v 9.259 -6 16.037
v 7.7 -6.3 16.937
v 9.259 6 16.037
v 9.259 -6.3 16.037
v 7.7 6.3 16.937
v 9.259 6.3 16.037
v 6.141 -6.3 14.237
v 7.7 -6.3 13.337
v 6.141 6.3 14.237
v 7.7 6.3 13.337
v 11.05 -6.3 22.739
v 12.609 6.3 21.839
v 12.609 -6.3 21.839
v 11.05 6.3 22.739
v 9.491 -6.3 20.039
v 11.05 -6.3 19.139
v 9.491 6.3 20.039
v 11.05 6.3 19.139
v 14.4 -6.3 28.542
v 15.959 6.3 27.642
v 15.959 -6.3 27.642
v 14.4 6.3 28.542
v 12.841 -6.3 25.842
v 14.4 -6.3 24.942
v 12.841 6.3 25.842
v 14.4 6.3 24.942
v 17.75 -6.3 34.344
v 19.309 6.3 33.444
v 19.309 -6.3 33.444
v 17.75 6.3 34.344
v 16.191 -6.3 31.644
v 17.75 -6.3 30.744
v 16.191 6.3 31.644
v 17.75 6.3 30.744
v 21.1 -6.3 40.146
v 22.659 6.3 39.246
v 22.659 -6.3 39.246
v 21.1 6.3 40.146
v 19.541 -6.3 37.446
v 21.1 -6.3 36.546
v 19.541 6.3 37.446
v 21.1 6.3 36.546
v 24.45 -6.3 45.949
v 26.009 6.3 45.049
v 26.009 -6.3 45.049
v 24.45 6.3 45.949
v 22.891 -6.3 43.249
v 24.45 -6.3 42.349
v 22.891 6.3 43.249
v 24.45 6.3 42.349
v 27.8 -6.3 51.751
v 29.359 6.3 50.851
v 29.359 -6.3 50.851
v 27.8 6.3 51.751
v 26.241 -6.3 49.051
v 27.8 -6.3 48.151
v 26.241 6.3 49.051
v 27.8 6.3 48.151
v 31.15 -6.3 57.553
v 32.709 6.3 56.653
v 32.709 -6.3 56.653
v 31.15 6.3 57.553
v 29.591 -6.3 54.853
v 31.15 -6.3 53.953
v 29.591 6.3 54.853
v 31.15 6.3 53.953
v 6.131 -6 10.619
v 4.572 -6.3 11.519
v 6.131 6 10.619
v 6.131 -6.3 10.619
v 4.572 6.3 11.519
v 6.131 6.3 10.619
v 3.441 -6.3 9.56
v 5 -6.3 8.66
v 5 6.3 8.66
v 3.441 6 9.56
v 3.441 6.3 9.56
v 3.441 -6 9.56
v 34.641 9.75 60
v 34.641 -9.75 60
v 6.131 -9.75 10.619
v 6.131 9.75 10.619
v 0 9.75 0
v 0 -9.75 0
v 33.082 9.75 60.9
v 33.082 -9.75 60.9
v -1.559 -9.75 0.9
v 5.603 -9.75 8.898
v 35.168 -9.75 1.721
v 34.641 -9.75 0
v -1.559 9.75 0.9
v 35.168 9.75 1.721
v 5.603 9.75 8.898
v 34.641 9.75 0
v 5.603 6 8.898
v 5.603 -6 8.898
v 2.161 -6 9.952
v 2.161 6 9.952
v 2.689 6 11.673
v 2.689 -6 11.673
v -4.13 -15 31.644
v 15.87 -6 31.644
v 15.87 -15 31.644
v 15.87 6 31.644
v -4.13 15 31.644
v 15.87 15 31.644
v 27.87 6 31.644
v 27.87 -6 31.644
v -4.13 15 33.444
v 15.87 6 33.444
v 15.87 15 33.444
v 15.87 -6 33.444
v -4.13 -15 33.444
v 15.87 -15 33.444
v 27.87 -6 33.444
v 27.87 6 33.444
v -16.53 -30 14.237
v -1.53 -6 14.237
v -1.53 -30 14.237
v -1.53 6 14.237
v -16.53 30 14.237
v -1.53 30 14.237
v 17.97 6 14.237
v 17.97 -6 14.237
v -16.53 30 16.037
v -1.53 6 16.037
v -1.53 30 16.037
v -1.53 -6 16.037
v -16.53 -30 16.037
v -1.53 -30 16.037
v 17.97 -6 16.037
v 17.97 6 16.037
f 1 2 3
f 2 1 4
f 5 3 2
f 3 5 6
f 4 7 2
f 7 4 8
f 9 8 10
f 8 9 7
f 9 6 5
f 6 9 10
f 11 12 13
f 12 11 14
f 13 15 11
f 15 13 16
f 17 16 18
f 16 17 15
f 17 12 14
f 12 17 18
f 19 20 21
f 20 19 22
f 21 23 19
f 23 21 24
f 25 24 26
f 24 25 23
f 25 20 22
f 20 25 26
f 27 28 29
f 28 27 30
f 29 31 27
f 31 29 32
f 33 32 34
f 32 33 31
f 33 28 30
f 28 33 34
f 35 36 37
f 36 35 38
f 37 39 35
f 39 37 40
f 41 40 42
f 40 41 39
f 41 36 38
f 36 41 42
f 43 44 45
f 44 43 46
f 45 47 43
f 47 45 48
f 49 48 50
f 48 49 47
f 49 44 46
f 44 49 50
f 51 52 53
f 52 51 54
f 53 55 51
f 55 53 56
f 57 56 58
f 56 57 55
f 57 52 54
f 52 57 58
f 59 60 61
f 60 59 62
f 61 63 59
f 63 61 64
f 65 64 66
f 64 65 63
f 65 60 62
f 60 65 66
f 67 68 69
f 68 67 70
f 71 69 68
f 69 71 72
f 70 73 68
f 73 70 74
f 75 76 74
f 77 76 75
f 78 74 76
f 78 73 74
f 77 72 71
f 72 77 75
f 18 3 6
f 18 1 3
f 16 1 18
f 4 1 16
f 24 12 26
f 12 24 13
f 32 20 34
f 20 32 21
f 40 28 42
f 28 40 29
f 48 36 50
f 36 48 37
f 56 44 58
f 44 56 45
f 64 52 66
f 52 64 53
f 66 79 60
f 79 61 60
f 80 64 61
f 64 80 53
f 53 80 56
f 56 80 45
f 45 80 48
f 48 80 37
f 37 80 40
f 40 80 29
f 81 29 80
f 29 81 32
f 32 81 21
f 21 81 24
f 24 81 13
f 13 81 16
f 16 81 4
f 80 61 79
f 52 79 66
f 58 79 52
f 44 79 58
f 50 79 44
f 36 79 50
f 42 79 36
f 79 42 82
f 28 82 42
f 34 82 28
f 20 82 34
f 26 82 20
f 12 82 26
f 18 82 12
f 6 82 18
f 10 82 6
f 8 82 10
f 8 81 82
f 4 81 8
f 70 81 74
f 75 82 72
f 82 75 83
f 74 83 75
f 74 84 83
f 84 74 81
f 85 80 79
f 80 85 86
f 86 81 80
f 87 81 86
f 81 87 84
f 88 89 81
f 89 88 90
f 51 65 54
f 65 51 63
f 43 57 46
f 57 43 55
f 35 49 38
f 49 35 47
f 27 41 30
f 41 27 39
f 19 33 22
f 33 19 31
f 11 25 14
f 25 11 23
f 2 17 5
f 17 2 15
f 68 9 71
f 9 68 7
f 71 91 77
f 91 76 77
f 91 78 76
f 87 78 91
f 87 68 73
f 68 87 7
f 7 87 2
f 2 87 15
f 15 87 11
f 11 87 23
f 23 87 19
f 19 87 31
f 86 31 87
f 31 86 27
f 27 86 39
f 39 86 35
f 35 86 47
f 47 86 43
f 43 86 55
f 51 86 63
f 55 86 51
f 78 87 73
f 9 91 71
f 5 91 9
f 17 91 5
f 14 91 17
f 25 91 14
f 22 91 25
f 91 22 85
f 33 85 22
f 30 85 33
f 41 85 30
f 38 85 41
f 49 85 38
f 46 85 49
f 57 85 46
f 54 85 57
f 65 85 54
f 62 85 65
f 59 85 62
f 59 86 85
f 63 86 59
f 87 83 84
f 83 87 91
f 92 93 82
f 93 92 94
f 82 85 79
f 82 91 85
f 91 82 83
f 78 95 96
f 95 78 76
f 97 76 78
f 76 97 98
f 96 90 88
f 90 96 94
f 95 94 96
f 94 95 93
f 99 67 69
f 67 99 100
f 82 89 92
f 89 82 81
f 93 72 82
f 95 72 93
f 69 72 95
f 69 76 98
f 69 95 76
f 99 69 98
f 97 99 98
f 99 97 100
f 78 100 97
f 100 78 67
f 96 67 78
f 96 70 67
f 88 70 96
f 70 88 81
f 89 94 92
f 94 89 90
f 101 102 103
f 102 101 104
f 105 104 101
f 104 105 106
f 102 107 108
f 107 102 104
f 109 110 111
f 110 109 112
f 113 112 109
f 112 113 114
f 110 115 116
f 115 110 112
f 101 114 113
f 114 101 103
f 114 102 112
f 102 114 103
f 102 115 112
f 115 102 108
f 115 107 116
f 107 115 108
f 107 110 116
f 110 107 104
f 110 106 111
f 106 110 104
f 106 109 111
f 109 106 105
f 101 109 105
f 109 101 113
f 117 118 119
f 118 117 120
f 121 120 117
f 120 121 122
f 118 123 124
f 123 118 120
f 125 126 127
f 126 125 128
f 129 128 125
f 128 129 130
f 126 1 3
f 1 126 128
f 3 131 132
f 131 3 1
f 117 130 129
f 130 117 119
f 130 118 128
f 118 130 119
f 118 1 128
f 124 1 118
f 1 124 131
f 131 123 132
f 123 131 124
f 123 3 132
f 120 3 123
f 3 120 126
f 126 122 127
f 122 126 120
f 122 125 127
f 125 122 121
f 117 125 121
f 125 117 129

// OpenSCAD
alpha=30;
h=60    ;
W1=12;
thickness=1.8;
L=h/cos(alpha);
echo("L");echo(L);
L2b=2*thickness;
W=19.5;
slotoffset=2;
slotspace=6.7;
cutline=1;

    // Orthogonal leg: 
//    pleg=L*sin(alpha)*sin(alpha);
//    L2a=L2b + L*sin(alpha)*cos(alpha);
//    Eleg=thickness;

    // generic leg
    pleg=10;
    hleg=pleg*cos(alpha) + thickness*sin(alpha);
    Cleg=L*sin(alpha) - (pleg*sin(alpha)-thickness*cos(alpha));
    alphaleg=atan(hleg/Cleg);
    //echo(alphaleg);
    Eleg=thickness*(1+sin(alpha-alphaleg))/cos(alpha-alphaleg);
    echo("Eleg");
    echo(Eleg);
    d=sqrt(Eleg*Eleg+thickness*thickness);
    L2a=L2b + hleg/sin(alphaleg) - d * sin(acos(thickness/d));
    echo("Leg length");
    echo(L2a-L2b);


E1=thickness*(1 + sin(alpha))/cos(alpha);
echo("E1");
echo(E1);

L3=15; // keyboard
L4=20; // screen

L3a=W;
L3b=L3a+L3;
Wkeyboard=60;
echo("Keyboard");
echo([Wkeyboard,L3b]);

L4a=W1;
L4b=L4a+L4;
Wscreen=30;
echo("Screen");
echo([Wscreen,L4b]);
slotscreen=5;
hscreen = (slotoffset + slotspace*slotscreen)*cos(alpha)
    + thickness*sin(alpha);

slotkeyboard=2;
hkeyboard = (slotoffset + slotspace*slotkeyboard)*cos(alpha)
    + thickness*sin(alpha);

echo("Length");
echo(L+W1+W1+(Wscreen-W1)/2+(Wkeyboard-W1)/2+2*cutline);
echo("Width");
echo(L4b+cutline);

// projection(cut=false) translate([0,0,50]) 
{
//Mounting
rotate([0,-(90-alpha),0]) 
//Cutting
//translate([-L4a,(W+W1)/2+2,0])
color("#00FF00",0.5)
difference() {
    linear_extrude(height=thickness) {
        polygon(points=[[0,-W/2],[L,-W/2],[L,W/2],[0,W/2]]);
    }
    union() {
        echo("p");
        for (i=[2:9]) {
            translate([0,0,-1]) linear_extrude(height=thickness+2) {
                p=slotoffset+slotspace*i;
                echo([p,p+E1]);
                polygon(points=[[p,-1.05*W1/2],[p+E1,-1.05*W1/2],[p+E1,1.05*W1/2],[p,1.05*W1/2]]);
            }
        }
        translate([0,0,-1]) linear_extrude(height=thickness+2) {
            polygon(points=[[pleg,-1.05*W1/2],[pleg+Eleg,-1.05*W1/2],[pleg+Eleg,1.05*W1/2],[pleg,1.05*W1/2]]);
        }
    }
}

// Cutting
//translate([Wscreen/2-W1/2,(W+W)/2+cutline,0])
color("#FF00FF")
// Mounting
translate([(L2a-L2b)*cos(alphaleg)+(pleg+Eleg)*sin(alpha)-thickness*sin(alphaleg),0,0])
rotate([0,alphaleg,0])
translate([-L2a,0,0])
linear_extrude(height=thickness) {
    polygon(points=[[0,-W1/2],[L2b,-W1/2],[L2b,-W/2],
           [L2a,-W/2],[L2a,W/2],[L2b,W/2],[L2b,W1/2],[0,W1/2]]);
}

// Mounting
translate([hscreen*tan(alpha)+0.8*L4a,0,hscreen])
rotate([0,0,180])
// Cutting
//translate([-cutline-W1/2,cutline-W/2,0])
//rotate([0,0,90])
color("#FF0000",0.5) 
linear_extrude(height=thickness) {
    polygon(points=[[0,-W1/2],[L4a,-W1/2],[L4a,-Wscreen/2],
           [L4b,-Wscreen/2],[L4b,Wscreen/2],
            [L4a,Wscreen/2],[L4a,W1/2],[0,W1/2]]);
}


// Mounting
translate([hkeyboard*tan(alpha)+0.5*L3a,0,hkeyboard])
rotate([0,0,180])
// Cutting
//translate([cutline+L+W1/2,cutline-W/2,0])
//rotate([0,0,90])
//translate([2,0,0])
color("#00FFFF",0.5) 
linear_extrude(height=thickness) {
    polygon(points=[[0,-W1/2],[L3a,-W1/2],[L3a,-Wkeyboard/2],
           [L3b,-Wkeyboard/2],[L3b,Wkeyboard/2],
            [L3a,Wkeyboard/2],[L3a,W1/2],[0,W1/2]]);
}
}
